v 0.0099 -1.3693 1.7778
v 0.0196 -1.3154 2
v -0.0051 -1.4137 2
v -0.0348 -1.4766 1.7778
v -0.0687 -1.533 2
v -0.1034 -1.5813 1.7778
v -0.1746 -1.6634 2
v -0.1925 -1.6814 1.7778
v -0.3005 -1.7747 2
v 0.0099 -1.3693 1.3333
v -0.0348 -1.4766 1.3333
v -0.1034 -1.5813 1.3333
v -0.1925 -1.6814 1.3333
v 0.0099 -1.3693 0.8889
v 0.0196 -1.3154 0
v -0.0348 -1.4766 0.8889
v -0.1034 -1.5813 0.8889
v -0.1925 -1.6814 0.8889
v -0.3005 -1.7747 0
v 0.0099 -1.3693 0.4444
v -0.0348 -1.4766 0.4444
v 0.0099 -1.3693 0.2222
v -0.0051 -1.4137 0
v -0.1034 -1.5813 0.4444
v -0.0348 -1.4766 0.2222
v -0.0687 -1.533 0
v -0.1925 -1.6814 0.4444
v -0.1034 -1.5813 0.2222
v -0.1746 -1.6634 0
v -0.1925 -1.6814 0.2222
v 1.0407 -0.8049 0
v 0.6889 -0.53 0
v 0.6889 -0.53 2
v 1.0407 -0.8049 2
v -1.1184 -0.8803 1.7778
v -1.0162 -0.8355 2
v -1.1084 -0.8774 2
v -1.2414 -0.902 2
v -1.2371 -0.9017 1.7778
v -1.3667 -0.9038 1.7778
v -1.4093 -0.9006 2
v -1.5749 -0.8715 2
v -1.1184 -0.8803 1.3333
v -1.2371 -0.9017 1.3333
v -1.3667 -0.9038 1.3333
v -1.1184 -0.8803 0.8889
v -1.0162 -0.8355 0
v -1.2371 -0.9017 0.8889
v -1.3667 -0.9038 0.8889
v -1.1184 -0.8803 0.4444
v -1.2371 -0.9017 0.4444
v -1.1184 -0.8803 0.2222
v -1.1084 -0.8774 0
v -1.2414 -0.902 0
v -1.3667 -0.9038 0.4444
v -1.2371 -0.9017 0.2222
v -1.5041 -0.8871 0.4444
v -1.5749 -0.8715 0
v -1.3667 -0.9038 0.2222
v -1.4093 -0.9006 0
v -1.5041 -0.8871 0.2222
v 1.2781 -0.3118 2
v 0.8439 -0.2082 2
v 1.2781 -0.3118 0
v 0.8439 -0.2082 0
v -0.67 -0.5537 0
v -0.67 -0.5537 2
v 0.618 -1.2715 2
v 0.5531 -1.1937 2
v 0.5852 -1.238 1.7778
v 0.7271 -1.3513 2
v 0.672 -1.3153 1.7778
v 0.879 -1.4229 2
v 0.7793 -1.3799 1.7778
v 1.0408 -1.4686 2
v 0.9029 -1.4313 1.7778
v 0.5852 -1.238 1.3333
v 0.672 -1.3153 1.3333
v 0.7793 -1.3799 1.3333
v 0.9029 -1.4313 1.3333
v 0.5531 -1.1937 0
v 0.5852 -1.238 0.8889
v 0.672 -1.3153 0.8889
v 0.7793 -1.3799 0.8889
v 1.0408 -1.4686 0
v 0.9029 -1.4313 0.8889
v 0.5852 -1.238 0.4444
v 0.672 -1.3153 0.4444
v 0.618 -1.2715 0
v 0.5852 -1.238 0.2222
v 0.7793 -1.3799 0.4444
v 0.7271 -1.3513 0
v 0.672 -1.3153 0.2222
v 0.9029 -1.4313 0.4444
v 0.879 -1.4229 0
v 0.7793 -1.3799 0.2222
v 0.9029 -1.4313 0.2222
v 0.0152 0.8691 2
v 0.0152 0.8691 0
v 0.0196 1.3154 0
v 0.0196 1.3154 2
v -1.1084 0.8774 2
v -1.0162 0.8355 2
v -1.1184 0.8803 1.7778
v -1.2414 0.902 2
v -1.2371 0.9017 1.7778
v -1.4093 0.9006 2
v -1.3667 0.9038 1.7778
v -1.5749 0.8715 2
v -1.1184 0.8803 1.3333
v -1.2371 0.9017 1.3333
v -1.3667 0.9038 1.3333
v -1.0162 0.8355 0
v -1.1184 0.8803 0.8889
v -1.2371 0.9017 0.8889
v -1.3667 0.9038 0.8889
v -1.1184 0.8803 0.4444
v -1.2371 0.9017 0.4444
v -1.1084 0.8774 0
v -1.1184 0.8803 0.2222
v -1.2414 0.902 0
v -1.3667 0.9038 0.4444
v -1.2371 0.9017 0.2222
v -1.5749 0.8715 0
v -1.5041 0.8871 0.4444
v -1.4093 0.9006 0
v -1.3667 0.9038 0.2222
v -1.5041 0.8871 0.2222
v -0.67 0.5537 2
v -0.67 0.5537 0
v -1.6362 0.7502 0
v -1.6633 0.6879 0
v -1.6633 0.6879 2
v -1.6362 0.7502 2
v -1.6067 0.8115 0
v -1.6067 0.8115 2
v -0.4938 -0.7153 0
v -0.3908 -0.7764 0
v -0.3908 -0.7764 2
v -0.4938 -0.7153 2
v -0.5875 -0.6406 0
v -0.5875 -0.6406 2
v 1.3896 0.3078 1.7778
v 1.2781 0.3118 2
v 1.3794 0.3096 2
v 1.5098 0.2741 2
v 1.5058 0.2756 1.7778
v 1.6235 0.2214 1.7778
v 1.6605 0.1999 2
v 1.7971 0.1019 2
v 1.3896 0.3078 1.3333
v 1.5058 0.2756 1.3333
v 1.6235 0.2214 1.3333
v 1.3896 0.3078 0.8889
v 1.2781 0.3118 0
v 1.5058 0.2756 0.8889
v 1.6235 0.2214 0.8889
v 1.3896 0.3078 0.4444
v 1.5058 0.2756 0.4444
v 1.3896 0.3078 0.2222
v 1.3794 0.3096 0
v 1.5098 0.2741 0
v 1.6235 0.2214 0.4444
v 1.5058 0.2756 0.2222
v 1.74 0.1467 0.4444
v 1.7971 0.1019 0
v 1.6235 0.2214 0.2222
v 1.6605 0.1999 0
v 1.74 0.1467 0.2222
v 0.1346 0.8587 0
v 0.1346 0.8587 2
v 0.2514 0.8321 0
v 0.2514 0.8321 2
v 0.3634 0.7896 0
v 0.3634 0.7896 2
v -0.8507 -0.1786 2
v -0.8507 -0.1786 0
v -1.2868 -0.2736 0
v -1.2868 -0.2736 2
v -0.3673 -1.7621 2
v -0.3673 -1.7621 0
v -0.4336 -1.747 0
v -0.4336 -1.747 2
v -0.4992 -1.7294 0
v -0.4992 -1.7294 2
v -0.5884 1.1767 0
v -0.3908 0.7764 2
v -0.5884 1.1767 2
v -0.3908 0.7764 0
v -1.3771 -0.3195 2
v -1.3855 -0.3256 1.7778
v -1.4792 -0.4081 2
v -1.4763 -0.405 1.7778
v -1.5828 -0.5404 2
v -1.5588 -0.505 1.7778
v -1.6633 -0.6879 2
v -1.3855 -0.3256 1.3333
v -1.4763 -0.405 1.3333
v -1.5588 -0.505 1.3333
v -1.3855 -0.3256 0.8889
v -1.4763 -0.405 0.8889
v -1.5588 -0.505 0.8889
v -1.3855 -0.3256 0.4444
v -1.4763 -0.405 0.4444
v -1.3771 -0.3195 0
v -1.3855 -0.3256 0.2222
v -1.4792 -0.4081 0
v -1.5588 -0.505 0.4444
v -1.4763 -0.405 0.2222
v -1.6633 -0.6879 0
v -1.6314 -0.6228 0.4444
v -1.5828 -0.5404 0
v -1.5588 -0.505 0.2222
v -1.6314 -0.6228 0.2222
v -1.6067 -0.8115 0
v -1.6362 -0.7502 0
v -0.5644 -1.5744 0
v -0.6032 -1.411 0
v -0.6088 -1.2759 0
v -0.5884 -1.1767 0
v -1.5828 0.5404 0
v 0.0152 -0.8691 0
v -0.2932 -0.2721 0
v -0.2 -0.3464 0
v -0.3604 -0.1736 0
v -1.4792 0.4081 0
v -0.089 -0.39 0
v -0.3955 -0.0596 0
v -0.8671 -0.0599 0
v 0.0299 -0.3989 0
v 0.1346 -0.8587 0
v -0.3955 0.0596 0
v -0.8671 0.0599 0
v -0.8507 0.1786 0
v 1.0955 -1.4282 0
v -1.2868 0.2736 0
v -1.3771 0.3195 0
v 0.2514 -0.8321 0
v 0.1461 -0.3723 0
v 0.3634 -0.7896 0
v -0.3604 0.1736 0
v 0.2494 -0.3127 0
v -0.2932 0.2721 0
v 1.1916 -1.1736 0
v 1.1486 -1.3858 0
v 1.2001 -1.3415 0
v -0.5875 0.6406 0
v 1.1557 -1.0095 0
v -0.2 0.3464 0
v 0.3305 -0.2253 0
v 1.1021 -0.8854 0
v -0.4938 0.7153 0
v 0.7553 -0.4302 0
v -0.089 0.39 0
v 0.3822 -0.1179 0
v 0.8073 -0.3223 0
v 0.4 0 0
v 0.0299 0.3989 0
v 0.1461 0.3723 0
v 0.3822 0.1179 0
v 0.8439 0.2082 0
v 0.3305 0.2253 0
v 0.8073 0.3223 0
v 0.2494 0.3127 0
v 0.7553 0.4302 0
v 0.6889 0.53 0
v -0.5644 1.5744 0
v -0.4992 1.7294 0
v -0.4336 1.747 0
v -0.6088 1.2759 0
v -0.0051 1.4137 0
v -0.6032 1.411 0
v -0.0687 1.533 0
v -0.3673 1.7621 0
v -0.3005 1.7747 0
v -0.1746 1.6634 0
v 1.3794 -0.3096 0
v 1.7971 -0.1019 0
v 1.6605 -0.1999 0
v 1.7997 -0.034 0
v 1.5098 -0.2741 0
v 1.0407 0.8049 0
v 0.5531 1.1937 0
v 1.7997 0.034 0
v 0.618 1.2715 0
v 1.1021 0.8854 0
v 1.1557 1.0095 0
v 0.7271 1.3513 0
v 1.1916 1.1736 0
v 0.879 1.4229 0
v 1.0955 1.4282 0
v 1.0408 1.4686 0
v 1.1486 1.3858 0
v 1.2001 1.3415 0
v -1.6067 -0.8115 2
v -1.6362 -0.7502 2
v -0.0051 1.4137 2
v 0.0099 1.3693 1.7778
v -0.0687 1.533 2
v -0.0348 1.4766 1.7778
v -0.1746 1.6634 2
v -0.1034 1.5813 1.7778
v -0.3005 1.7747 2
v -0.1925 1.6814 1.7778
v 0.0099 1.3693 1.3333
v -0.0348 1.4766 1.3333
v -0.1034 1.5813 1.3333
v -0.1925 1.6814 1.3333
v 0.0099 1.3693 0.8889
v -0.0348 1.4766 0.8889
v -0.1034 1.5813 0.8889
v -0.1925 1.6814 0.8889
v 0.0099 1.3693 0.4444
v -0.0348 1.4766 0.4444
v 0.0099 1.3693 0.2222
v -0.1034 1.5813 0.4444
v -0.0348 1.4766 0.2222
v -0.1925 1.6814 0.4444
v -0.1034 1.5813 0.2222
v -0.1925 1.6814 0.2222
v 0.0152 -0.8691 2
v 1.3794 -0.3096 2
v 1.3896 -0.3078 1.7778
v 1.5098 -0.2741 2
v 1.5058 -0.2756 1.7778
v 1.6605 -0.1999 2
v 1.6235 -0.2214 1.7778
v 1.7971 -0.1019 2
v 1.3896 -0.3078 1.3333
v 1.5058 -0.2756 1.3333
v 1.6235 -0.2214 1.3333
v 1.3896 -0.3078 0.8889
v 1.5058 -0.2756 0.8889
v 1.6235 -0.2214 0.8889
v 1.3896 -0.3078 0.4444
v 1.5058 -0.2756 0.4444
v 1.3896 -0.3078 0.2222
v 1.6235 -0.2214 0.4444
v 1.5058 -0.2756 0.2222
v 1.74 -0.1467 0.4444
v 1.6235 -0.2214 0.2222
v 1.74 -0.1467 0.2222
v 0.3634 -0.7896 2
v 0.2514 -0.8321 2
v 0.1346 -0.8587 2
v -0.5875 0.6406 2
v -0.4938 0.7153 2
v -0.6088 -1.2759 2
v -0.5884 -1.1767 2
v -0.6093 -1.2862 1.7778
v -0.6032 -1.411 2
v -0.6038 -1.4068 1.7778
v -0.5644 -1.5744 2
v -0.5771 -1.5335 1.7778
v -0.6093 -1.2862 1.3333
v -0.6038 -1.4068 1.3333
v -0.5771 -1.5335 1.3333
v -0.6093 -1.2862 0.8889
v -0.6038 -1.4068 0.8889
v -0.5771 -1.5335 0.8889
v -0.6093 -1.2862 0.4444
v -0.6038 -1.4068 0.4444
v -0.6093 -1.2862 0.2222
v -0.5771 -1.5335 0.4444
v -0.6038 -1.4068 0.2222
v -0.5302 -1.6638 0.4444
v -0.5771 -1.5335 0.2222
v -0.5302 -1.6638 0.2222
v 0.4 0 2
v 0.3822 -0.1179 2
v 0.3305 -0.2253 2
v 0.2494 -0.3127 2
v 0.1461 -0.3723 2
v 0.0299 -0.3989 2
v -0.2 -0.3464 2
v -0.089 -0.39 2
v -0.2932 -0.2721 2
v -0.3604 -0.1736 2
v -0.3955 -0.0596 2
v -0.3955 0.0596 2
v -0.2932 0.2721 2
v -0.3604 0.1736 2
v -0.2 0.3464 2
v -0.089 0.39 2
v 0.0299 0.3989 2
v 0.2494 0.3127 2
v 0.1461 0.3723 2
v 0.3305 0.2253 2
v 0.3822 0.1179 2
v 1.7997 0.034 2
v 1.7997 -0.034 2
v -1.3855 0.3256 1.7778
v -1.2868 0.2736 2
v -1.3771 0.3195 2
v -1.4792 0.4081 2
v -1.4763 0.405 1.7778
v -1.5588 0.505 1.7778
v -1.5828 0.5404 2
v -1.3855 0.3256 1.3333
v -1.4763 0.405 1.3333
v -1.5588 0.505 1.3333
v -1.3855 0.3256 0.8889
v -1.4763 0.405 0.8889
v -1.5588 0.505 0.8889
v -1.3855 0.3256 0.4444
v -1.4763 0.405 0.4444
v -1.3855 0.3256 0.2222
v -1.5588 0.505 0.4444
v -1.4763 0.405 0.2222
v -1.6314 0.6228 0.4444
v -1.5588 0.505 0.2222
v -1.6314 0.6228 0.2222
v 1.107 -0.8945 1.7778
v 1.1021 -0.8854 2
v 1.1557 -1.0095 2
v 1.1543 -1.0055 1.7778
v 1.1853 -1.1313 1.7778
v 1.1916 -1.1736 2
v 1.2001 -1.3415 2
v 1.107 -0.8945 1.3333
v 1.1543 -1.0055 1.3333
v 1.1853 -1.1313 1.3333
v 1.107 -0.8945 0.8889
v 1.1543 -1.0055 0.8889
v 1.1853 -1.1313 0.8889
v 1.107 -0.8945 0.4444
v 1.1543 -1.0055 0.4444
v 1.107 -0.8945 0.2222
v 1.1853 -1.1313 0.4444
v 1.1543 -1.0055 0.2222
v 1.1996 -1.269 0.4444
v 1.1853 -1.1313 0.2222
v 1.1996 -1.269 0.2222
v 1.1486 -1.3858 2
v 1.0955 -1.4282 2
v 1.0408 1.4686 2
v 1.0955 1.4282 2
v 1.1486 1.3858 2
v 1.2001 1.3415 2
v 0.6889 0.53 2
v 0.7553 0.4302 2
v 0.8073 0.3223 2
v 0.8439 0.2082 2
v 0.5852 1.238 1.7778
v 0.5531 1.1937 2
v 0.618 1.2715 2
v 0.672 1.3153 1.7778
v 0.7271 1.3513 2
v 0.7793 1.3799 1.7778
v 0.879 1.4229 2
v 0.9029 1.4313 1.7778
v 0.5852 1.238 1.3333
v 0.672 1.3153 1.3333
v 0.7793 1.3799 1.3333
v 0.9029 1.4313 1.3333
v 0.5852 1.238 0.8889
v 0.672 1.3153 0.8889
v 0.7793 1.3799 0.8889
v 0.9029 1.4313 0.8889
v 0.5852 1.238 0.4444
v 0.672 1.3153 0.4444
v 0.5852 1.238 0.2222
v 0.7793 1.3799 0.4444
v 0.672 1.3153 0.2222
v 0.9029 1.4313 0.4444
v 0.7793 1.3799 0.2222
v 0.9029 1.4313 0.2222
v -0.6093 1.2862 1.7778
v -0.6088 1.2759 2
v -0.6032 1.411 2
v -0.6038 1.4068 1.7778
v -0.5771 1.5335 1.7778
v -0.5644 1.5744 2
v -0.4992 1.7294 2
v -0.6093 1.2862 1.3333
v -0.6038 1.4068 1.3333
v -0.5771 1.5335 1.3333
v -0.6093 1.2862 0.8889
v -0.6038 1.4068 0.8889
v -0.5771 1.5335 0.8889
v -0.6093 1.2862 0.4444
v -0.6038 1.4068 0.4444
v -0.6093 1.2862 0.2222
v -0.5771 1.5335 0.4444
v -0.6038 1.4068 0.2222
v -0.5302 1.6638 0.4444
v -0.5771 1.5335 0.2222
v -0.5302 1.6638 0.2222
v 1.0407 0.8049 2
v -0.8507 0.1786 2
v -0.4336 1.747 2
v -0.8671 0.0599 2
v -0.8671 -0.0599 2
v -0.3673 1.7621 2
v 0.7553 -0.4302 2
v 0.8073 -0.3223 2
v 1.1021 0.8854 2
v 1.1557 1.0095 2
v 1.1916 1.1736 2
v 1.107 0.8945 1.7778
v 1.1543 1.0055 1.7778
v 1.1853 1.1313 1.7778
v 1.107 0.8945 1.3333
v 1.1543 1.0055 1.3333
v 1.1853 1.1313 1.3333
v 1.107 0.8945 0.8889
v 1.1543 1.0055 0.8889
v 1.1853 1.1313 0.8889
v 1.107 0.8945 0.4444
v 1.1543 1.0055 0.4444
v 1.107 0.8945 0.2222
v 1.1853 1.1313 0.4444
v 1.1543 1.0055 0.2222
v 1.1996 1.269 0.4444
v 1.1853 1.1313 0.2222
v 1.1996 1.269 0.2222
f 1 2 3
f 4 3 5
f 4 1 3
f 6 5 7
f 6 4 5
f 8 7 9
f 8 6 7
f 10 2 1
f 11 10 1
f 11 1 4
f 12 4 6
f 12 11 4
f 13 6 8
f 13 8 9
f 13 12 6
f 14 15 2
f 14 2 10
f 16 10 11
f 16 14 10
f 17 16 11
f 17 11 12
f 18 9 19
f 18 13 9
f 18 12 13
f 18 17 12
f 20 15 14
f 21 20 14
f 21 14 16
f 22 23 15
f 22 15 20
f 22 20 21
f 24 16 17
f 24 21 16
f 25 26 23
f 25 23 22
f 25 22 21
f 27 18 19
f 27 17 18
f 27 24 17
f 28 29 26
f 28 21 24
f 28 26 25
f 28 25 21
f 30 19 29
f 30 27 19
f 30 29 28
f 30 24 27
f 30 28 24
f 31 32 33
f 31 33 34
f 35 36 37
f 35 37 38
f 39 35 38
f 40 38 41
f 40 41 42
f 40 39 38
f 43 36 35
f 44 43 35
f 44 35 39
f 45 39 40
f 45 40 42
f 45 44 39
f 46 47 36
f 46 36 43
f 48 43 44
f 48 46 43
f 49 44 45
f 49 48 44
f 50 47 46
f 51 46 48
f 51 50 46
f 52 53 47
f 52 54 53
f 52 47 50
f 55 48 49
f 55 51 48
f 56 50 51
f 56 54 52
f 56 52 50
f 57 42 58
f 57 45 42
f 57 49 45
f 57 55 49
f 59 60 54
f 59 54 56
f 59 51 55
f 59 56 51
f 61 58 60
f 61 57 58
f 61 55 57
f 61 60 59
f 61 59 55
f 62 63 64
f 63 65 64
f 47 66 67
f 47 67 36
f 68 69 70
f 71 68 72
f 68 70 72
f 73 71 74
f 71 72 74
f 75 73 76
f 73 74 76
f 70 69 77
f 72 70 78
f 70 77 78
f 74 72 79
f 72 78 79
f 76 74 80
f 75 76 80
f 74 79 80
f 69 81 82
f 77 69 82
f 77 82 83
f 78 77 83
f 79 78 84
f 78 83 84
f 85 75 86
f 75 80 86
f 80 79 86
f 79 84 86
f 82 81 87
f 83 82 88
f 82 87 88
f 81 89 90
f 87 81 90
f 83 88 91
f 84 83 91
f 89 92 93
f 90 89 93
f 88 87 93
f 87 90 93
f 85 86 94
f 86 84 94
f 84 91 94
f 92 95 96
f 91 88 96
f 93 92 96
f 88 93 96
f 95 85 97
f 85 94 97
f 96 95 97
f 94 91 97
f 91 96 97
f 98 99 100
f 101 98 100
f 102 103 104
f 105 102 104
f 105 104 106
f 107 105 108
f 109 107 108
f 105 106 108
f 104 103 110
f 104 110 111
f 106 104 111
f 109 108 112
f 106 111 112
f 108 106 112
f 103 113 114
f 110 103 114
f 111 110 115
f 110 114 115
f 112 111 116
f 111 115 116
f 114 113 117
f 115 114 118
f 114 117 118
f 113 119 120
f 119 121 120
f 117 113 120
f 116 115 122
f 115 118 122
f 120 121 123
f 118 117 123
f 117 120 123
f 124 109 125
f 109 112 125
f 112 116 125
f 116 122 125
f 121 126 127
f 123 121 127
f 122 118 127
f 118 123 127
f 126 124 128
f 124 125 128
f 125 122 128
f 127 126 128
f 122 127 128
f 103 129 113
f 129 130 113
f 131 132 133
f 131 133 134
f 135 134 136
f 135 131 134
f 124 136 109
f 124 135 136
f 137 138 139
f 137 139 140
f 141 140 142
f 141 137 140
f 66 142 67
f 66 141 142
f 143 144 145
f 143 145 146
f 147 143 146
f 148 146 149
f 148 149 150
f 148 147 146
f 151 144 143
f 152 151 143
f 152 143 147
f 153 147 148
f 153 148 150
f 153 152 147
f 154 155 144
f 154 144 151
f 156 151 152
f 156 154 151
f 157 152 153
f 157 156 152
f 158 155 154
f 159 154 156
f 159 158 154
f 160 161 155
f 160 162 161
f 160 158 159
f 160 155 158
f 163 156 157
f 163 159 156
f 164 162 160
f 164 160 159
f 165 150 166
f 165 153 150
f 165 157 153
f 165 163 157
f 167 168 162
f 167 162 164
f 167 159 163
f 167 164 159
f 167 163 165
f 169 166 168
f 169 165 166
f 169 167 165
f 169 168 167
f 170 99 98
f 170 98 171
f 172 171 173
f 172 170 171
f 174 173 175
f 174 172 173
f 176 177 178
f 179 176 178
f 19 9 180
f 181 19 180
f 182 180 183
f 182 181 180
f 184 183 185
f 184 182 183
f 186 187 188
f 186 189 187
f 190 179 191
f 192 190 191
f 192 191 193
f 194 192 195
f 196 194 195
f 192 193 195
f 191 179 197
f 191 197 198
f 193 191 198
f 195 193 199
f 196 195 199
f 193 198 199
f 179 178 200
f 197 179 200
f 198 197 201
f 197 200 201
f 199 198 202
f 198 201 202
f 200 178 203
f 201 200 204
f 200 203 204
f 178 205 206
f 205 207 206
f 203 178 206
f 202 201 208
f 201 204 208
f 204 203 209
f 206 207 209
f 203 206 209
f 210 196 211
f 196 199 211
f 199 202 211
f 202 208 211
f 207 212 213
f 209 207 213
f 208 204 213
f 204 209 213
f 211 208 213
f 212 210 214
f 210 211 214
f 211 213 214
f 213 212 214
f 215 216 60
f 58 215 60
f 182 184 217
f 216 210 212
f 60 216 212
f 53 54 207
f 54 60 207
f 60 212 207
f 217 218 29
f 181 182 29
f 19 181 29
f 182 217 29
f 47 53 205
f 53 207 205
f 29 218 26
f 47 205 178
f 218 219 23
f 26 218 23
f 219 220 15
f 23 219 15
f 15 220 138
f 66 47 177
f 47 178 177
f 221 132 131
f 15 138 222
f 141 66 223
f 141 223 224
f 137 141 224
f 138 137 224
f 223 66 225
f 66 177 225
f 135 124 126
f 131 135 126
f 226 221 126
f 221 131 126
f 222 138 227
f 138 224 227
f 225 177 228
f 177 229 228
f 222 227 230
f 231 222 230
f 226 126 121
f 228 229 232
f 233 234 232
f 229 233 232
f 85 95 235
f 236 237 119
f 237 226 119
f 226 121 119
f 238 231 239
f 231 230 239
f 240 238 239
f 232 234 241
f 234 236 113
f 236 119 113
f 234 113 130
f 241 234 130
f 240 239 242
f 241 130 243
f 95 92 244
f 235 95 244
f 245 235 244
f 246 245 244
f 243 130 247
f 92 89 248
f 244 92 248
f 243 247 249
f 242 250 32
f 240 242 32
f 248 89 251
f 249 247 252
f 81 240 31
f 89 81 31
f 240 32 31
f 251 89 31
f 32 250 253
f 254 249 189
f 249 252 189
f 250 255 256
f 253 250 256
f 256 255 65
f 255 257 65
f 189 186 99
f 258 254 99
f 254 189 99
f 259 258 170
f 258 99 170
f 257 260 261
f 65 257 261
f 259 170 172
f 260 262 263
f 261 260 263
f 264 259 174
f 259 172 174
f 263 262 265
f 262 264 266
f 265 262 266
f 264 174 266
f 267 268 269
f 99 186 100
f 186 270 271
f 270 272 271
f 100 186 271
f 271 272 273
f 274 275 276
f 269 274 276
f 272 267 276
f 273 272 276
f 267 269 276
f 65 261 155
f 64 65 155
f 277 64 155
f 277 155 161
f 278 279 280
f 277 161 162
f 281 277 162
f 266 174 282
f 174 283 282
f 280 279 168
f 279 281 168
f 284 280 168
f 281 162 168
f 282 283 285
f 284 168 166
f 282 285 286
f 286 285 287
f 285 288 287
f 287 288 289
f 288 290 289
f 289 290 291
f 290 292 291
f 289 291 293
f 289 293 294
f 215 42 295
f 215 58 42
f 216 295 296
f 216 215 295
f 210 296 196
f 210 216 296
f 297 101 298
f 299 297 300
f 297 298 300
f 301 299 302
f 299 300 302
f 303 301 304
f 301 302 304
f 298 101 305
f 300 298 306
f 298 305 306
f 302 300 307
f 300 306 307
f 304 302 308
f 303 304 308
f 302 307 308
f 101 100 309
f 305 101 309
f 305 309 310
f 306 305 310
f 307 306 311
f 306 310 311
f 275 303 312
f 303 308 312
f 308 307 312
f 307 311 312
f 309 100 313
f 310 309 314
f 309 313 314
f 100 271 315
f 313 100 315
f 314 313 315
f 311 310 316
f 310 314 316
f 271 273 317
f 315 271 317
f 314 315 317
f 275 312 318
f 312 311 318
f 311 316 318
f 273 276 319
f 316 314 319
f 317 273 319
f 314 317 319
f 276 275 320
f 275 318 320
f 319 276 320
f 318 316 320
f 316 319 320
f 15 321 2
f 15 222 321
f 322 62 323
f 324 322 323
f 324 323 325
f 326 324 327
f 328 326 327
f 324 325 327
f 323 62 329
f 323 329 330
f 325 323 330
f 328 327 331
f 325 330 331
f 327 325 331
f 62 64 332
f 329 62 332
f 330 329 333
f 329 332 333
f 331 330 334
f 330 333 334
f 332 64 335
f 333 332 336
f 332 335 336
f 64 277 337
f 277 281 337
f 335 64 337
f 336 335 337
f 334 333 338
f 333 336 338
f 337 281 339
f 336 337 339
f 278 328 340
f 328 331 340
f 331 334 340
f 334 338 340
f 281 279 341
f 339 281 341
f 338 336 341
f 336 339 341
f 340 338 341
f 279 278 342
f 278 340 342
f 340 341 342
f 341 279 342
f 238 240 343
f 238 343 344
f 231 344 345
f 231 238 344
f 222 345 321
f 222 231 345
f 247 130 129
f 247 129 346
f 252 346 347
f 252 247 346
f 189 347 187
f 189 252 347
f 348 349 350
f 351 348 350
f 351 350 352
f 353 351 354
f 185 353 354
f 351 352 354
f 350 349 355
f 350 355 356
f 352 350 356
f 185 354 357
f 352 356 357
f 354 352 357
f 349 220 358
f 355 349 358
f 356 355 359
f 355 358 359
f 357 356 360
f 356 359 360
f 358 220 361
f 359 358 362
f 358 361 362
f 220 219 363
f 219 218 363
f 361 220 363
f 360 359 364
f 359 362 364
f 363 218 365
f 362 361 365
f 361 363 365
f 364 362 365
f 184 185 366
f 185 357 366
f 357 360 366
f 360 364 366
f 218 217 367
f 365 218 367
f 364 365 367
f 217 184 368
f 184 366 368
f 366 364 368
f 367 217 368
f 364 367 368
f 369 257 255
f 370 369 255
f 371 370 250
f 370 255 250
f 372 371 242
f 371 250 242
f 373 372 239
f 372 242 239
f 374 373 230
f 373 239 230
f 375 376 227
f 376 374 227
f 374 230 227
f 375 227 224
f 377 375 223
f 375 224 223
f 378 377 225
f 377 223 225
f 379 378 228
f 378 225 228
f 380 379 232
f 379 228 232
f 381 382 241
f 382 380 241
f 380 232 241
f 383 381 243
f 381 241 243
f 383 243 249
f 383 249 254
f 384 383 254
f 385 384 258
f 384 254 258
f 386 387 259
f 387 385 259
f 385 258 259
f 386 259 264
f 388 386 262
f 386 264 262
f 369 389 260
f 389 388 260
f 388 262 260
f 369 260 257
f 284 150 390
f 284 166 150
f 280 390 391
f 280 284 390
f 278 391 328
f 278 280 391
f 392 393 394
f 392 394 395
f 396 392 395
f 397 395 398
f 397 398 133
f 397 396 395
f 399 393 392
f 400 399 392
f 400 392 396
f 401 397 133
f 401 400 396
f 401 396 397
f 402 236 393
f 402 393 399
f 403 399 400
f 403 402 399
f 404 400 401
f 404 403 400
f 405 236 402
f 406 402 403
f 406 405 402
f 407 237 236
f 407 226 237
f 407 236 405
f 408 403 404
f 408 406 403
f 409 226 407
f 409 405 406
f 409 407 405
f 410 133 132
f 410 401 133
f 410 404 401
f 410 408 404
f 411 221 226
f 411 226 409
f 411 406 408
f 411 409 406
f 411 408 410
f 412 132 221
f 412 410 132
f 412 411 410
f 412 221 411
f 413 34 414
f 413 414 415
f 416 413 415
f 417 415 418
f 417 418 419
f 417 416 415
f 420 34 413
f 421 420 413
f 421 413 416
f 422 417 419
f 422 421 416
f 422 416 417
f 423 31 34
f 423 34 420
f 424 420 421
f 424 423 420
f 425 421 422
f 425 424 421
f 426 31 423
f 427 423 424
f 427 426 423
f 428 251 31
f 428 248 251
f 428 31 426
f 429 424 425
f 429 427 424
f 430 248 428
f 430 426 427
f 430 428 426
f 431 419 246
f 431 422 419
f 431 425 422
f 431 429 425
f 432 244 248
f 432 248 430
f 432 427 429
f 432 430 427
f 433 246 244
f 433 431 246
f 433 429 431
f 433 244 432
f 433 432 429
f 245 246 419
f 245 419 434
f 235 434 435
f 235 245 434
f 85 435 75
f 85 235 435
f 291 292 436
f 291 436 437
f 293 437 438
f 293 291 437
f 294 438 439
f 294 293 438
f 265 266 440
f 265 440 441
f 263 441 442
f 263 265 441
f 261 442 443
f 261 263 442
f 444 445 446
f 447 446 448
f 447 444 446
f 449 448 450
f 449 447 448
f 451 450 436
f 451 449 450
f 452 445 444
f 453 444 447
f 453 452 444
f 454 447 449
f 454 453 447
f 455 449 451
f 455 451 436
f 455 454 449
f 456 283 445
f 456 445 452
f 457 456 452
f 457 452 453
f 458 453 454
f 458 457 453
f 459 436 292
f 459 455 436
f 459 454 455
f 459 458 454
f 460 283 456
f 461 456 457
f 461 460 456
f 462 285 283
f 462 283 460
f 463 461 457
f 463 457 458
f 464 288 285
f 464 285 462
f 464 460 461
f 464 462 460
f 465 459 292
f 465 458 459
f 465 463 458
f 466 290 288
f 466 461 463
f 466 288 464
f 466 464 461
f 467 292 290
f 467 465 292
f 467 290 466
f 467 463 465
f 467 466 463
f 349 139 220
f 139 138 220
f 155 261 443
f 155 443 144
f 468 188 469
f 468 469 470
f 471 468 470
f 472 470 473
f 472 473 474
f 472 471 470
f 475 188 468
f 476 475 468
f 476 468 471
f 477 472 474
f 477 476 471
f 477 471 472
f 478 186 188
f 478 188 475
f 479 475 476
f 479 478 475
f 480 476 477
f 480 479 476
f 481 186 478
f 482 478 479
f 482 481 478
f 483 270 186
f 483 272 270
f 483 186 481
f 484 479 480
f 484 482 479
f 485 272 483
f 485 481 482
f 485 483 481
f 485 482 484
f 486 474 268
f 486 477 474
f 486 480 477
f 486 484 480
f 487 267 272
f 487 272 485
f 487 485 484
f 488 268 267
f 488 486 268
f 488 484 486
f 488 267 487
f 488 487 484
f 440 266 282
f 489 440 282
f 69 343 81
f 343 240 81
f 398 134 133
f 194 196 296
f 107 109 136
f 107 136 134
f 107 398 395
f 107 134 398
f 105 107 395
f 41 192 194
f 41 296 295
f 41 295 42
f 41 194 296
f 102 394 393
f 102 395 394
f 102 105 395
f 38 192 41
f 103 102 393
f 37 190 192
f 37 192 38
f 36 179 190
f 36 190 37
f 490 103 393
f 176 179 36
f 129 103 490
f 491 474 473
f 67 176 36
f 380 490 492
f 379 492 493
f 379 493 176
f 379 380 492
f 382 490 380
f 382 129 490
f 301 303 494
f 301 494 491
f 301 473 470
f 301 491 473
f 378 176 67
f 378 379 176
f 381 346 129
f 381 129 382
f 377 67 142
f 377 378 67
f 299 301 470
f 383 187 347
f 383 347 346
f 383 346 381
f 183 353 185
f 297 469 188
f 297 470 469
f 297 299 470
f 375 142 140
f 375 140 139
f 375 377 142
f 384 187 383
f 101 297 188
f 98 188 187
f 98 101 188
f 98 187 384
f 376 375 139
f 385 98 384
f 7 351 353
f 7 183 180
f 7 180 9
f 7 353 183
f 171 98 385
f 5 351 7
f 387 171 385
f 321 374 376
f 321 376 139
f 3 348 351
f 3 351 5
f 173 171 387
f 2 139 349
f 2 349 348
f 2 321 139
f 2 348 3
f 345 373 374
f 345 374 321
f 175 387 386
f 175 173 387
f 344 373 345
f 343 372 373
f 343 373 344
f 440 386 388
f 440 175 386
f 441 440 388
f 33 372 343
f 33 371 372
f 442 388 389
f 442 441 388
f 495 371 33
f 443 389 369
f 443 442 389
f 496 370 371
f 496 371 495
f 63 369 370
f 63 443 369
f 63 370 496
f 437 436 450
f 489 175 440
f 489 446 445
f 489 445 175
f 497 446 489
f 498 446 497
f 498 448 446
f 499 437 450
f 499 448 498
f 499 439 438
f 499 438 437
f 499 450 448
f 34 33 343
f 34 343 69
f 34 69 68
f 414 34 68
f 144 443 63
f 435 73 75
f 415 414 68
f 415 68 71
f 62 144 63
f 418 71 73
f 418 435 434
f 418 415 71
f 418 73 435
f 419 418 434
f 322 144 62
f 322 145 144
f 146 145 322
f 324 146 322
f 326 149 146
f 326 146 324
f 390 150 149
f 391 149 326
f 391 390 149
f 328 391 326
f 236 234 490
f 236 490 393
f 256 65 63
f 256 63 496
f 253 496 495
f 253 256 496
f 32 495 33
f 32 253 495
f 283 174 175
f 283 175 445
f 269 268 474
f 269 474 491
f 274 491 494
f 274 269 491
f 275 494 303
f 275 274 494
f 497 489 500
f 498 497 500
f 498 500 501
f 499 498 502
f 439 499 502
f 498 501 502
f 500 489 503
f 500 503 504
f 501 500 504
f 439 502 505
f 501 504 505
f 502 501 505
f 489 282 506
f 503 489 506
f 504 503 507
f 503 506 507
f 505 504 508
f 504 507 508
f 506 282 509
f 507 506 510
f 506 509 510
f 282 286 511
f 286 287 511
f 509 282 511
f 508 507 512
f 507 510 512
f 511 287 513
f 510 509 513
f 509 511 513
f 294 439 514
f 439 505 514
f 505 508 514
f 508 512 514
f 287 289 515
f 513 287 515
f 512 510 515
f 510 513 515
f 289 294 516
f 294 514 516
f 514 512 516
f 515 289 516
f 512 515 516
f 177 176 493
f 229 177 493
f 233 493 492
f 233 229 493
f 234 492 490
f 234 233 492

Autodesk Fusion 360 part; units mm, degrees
sketch "スケッチ1" plane through (0, 0, 0) normal (0, 0, 1) x (1, 0, 0) in component "Spur Gear (7 teeth)"
  circle A0 centre (0, 0) radius 0.8692
  circle A1 centre (0, 0) radius 0.25
extrude "押し出し1" add sketch "スケッチ1" along normal blind 2 makes body 1 in component "Spur Gear (7 teeth)"
sketch "スケッチ2" plane through (0, 0, 0) normal (0, 0, 1) x (1, 0, 0) in component "Spur Gear (7 teeth)"
  spline S0 degree 3 poles (1.2786, -0.3095) (1.2969, -0.311) (1.3342, -0.314) (1.391, -0.306) (1.4488, -0.2928) (1.5073, -0.2734) (1.5661, -0.2487) (1.6249, -0.2188) (1.6834, -0.1837) (1.7414, -0.1439) (1.7785, -0.1139) (1.7973, -0.0987) knots 0 0 0 0 0.00548 0.011189 0.01712 0.023272 0.029644 0.036236 0.043049 0.050082 0.057335 0.057335 0.057335 0.057335
  spline S1 degree 3 poles (1.2786, 0.3095) (1.2969, 0.311) (1.3342, 0.314) (1.391, 0.306) (1.4488, 0.2928) (1.5073, 0.2734) (1.5661, 0.2487) (1.6249, 0.2188) (1.6834, 0.1837) (1.7414, 0.1439) (1.7785, 0.1139) (1.7973, 0.0987) knots 0 0 0 0 0.00548 0.011189 0.01712 0.023272 0.029644 0.036236 0.043049 0.050082 0.057335 0.057335 0.057335 0.057335
  arc A0 (1.7973, -0.0987) -> (1.7973, 0.0987) centre (0, 0) ccw
  line L0 (0.8351, -0.2045) -> (1.2786, -0.3095)
  line L1 (0.8351, 0.2045) -> (1.2786, 0.3095)
  line L2 (0.8351, -0.2045) -> (0.8351, 0.2045)
  point P0 (1.3334, -0.312)
  point P1 (1.3901, -0.3053)
  point P2 (1.4479, -0.2921)
  point P3 (1.5063, -0.2729)
  point P4 (1.5651, -0.2483)
  point P5 (1.6239, -0.2184)
  point P6 (1.6824, -0.1835)
  point P7 (1.7403, -0.1436)
  point P8 (1.3334, 0.312)
  point P9 (1.3901, 0.3053)
  point P10 (1.4479, 0.2921)
  point P11 (1.5063, 0.2729)
  point P12 (1.5651, 0.2483)
  point P13 (1.6239, 0.2184)
  point P14 (1.6824, 0.1835)
  point P15 (1.7403, 0.1436)
extrude "押し出し2" add sketch "スケッチ2" along normal blind 2 bodies 1 in component "Spur Gear (7 teeth)"
fillet "フィレット1" radius 0.21 2 edges at (0.8443, -0.2067, 1) (0.8443, 0.2067, 1) on bodies 1 in component "Spur Gear (7 teeth)"
pattern_circular "C パターン1" count 7 over 360 about axis through (0, 0, 0) along (0, 0, 1) of "押し出し2", "フィレット1" in component "Spur Gear (7 teeth)"
sketch "スケッチ3" plane through (0, 0, 0) normal (0, 0, 1) x (1, 0, 0) in component "Spur Gear (7 teeth)"
  circle A0 centre (0, 0) radius 1.4 construction
sketch "スケッチ1 (2)" plane through (0, 0, 0) normal (0, 0, 1) x (1, 0, 0) in component "Spur Gear (7 teeth) (1)"
  circle A0 centre (0, 0) radius 0.8692
  circle A1 centre (0, 0) radius 0.4
extrude "押し出し1'" add sketch "スケッチ1 (2)" along normal blind 2 separate body makes body 2 in component "Spur Gear (7 teeth) (1)"
sketch "スケッチ2 (2)" plane through (0, 0, 0) normal (0, 0, 1) x (1, 0, 0) in component "Spur Gear (7 teeth) (1)"
  spline S0 degree 3 poles (1.2781, -0.3118) (1.2963, -0.3133) (1.3336, -0.3164) (1.3905, -0.3085) (1.4483, -0.2954) (1.5068, -0.2761) (1.5657, -0.2515) (1.6245, -0.2217) (1.683, -0.1867) (1.7412, -0.147) (1.7783, -0.1171) (1.7971, -0.1019) knots 0 0 0 0 0.00548 0.011189 0.01712 0.023272 0.029644 0.036236 0.043049 0.050082 0.057335 0.057335 0.057335 0.057335
  spline S1 degree 3 poles (1.2781, 0.3118) (1.2963, 0.3133) (1.3336, 0.3164) (1.3905, 0.3085) (1.4483, 0.2954) (1.5068, 0.2761) (1.5657, 0.2515) (1.6245, 0.2217) (1.683, 0.1867) (1.7412, 0.147) (1.7783, 0.1171) (1.7971, 0.1019) knots 0 0 0 0 0.00548 0.011189 0.01712 0.023272 0.029644 0.036236 0.043049 0.050082 0.057335 0.057335 0.057335 0.057335
  arc A0 (1.7971, -0.1019) -> (1.7971, 0.1019) centre (0, 0) ccw
  line L0 (0.8347, -0.206) -> (1.2781, -0.3118)
  line L1 (0.8347, 0.206) -> (1.2781, 0.3118)
  line L2 (0.8347, -0.206) -> (0.8347, 0.206)
  point P0 (1.3328, -0.3144)
  point P1 (1.3895, -0.3078)
  point P2 (1.4474, -0.2946)
  point P3 (1.5059, -0.2756)
  point P4 (1.5647, -0.2511)
  point P5 (1.6235, -0.2213)
  point P6 (1.682, -0.1865)
  point P7 (1.74, -0.1467)
  point P8 (1.3328, 0.3144)
  point P9 (1.3895, 0.3078)
  point P10 (1.4474, 0.2946)
  point P11 (1.5059, 0.2756)
  point P12 (1.5647, 0.2511)
  point P13 (1.6235, 0.2213)
  point P14 (1.682, 0.1865)
  point P15 (1.74, 0.1467)
extrude "押し出し2'" add sketch "スケッチ2 (2)" along normal blind 2 bodies 2 in component "Spur Gear (7 teeth) (1)"
pattern_circular "C パターン1'" count 7 over 360 about axis through (0, 0, 0) along (0, 0, 1) of "押し出し2'" in component "Spur Gear (7 teeth) (1)"
sketch "スケッチ3 (2)" plane through (0, 0, 0) normal (0, 0, 1) x (1, 0, 0) in component "Spur Gear (7 teeth) (1)"
  circle A0 centre (0, 0) radius 1.4 construction
component "Spur Gear (7 teeth) (1)" placed x (1, 0, 0) y (0, 1, 0) z (0, 0, 1) at (0, 0, 0)
